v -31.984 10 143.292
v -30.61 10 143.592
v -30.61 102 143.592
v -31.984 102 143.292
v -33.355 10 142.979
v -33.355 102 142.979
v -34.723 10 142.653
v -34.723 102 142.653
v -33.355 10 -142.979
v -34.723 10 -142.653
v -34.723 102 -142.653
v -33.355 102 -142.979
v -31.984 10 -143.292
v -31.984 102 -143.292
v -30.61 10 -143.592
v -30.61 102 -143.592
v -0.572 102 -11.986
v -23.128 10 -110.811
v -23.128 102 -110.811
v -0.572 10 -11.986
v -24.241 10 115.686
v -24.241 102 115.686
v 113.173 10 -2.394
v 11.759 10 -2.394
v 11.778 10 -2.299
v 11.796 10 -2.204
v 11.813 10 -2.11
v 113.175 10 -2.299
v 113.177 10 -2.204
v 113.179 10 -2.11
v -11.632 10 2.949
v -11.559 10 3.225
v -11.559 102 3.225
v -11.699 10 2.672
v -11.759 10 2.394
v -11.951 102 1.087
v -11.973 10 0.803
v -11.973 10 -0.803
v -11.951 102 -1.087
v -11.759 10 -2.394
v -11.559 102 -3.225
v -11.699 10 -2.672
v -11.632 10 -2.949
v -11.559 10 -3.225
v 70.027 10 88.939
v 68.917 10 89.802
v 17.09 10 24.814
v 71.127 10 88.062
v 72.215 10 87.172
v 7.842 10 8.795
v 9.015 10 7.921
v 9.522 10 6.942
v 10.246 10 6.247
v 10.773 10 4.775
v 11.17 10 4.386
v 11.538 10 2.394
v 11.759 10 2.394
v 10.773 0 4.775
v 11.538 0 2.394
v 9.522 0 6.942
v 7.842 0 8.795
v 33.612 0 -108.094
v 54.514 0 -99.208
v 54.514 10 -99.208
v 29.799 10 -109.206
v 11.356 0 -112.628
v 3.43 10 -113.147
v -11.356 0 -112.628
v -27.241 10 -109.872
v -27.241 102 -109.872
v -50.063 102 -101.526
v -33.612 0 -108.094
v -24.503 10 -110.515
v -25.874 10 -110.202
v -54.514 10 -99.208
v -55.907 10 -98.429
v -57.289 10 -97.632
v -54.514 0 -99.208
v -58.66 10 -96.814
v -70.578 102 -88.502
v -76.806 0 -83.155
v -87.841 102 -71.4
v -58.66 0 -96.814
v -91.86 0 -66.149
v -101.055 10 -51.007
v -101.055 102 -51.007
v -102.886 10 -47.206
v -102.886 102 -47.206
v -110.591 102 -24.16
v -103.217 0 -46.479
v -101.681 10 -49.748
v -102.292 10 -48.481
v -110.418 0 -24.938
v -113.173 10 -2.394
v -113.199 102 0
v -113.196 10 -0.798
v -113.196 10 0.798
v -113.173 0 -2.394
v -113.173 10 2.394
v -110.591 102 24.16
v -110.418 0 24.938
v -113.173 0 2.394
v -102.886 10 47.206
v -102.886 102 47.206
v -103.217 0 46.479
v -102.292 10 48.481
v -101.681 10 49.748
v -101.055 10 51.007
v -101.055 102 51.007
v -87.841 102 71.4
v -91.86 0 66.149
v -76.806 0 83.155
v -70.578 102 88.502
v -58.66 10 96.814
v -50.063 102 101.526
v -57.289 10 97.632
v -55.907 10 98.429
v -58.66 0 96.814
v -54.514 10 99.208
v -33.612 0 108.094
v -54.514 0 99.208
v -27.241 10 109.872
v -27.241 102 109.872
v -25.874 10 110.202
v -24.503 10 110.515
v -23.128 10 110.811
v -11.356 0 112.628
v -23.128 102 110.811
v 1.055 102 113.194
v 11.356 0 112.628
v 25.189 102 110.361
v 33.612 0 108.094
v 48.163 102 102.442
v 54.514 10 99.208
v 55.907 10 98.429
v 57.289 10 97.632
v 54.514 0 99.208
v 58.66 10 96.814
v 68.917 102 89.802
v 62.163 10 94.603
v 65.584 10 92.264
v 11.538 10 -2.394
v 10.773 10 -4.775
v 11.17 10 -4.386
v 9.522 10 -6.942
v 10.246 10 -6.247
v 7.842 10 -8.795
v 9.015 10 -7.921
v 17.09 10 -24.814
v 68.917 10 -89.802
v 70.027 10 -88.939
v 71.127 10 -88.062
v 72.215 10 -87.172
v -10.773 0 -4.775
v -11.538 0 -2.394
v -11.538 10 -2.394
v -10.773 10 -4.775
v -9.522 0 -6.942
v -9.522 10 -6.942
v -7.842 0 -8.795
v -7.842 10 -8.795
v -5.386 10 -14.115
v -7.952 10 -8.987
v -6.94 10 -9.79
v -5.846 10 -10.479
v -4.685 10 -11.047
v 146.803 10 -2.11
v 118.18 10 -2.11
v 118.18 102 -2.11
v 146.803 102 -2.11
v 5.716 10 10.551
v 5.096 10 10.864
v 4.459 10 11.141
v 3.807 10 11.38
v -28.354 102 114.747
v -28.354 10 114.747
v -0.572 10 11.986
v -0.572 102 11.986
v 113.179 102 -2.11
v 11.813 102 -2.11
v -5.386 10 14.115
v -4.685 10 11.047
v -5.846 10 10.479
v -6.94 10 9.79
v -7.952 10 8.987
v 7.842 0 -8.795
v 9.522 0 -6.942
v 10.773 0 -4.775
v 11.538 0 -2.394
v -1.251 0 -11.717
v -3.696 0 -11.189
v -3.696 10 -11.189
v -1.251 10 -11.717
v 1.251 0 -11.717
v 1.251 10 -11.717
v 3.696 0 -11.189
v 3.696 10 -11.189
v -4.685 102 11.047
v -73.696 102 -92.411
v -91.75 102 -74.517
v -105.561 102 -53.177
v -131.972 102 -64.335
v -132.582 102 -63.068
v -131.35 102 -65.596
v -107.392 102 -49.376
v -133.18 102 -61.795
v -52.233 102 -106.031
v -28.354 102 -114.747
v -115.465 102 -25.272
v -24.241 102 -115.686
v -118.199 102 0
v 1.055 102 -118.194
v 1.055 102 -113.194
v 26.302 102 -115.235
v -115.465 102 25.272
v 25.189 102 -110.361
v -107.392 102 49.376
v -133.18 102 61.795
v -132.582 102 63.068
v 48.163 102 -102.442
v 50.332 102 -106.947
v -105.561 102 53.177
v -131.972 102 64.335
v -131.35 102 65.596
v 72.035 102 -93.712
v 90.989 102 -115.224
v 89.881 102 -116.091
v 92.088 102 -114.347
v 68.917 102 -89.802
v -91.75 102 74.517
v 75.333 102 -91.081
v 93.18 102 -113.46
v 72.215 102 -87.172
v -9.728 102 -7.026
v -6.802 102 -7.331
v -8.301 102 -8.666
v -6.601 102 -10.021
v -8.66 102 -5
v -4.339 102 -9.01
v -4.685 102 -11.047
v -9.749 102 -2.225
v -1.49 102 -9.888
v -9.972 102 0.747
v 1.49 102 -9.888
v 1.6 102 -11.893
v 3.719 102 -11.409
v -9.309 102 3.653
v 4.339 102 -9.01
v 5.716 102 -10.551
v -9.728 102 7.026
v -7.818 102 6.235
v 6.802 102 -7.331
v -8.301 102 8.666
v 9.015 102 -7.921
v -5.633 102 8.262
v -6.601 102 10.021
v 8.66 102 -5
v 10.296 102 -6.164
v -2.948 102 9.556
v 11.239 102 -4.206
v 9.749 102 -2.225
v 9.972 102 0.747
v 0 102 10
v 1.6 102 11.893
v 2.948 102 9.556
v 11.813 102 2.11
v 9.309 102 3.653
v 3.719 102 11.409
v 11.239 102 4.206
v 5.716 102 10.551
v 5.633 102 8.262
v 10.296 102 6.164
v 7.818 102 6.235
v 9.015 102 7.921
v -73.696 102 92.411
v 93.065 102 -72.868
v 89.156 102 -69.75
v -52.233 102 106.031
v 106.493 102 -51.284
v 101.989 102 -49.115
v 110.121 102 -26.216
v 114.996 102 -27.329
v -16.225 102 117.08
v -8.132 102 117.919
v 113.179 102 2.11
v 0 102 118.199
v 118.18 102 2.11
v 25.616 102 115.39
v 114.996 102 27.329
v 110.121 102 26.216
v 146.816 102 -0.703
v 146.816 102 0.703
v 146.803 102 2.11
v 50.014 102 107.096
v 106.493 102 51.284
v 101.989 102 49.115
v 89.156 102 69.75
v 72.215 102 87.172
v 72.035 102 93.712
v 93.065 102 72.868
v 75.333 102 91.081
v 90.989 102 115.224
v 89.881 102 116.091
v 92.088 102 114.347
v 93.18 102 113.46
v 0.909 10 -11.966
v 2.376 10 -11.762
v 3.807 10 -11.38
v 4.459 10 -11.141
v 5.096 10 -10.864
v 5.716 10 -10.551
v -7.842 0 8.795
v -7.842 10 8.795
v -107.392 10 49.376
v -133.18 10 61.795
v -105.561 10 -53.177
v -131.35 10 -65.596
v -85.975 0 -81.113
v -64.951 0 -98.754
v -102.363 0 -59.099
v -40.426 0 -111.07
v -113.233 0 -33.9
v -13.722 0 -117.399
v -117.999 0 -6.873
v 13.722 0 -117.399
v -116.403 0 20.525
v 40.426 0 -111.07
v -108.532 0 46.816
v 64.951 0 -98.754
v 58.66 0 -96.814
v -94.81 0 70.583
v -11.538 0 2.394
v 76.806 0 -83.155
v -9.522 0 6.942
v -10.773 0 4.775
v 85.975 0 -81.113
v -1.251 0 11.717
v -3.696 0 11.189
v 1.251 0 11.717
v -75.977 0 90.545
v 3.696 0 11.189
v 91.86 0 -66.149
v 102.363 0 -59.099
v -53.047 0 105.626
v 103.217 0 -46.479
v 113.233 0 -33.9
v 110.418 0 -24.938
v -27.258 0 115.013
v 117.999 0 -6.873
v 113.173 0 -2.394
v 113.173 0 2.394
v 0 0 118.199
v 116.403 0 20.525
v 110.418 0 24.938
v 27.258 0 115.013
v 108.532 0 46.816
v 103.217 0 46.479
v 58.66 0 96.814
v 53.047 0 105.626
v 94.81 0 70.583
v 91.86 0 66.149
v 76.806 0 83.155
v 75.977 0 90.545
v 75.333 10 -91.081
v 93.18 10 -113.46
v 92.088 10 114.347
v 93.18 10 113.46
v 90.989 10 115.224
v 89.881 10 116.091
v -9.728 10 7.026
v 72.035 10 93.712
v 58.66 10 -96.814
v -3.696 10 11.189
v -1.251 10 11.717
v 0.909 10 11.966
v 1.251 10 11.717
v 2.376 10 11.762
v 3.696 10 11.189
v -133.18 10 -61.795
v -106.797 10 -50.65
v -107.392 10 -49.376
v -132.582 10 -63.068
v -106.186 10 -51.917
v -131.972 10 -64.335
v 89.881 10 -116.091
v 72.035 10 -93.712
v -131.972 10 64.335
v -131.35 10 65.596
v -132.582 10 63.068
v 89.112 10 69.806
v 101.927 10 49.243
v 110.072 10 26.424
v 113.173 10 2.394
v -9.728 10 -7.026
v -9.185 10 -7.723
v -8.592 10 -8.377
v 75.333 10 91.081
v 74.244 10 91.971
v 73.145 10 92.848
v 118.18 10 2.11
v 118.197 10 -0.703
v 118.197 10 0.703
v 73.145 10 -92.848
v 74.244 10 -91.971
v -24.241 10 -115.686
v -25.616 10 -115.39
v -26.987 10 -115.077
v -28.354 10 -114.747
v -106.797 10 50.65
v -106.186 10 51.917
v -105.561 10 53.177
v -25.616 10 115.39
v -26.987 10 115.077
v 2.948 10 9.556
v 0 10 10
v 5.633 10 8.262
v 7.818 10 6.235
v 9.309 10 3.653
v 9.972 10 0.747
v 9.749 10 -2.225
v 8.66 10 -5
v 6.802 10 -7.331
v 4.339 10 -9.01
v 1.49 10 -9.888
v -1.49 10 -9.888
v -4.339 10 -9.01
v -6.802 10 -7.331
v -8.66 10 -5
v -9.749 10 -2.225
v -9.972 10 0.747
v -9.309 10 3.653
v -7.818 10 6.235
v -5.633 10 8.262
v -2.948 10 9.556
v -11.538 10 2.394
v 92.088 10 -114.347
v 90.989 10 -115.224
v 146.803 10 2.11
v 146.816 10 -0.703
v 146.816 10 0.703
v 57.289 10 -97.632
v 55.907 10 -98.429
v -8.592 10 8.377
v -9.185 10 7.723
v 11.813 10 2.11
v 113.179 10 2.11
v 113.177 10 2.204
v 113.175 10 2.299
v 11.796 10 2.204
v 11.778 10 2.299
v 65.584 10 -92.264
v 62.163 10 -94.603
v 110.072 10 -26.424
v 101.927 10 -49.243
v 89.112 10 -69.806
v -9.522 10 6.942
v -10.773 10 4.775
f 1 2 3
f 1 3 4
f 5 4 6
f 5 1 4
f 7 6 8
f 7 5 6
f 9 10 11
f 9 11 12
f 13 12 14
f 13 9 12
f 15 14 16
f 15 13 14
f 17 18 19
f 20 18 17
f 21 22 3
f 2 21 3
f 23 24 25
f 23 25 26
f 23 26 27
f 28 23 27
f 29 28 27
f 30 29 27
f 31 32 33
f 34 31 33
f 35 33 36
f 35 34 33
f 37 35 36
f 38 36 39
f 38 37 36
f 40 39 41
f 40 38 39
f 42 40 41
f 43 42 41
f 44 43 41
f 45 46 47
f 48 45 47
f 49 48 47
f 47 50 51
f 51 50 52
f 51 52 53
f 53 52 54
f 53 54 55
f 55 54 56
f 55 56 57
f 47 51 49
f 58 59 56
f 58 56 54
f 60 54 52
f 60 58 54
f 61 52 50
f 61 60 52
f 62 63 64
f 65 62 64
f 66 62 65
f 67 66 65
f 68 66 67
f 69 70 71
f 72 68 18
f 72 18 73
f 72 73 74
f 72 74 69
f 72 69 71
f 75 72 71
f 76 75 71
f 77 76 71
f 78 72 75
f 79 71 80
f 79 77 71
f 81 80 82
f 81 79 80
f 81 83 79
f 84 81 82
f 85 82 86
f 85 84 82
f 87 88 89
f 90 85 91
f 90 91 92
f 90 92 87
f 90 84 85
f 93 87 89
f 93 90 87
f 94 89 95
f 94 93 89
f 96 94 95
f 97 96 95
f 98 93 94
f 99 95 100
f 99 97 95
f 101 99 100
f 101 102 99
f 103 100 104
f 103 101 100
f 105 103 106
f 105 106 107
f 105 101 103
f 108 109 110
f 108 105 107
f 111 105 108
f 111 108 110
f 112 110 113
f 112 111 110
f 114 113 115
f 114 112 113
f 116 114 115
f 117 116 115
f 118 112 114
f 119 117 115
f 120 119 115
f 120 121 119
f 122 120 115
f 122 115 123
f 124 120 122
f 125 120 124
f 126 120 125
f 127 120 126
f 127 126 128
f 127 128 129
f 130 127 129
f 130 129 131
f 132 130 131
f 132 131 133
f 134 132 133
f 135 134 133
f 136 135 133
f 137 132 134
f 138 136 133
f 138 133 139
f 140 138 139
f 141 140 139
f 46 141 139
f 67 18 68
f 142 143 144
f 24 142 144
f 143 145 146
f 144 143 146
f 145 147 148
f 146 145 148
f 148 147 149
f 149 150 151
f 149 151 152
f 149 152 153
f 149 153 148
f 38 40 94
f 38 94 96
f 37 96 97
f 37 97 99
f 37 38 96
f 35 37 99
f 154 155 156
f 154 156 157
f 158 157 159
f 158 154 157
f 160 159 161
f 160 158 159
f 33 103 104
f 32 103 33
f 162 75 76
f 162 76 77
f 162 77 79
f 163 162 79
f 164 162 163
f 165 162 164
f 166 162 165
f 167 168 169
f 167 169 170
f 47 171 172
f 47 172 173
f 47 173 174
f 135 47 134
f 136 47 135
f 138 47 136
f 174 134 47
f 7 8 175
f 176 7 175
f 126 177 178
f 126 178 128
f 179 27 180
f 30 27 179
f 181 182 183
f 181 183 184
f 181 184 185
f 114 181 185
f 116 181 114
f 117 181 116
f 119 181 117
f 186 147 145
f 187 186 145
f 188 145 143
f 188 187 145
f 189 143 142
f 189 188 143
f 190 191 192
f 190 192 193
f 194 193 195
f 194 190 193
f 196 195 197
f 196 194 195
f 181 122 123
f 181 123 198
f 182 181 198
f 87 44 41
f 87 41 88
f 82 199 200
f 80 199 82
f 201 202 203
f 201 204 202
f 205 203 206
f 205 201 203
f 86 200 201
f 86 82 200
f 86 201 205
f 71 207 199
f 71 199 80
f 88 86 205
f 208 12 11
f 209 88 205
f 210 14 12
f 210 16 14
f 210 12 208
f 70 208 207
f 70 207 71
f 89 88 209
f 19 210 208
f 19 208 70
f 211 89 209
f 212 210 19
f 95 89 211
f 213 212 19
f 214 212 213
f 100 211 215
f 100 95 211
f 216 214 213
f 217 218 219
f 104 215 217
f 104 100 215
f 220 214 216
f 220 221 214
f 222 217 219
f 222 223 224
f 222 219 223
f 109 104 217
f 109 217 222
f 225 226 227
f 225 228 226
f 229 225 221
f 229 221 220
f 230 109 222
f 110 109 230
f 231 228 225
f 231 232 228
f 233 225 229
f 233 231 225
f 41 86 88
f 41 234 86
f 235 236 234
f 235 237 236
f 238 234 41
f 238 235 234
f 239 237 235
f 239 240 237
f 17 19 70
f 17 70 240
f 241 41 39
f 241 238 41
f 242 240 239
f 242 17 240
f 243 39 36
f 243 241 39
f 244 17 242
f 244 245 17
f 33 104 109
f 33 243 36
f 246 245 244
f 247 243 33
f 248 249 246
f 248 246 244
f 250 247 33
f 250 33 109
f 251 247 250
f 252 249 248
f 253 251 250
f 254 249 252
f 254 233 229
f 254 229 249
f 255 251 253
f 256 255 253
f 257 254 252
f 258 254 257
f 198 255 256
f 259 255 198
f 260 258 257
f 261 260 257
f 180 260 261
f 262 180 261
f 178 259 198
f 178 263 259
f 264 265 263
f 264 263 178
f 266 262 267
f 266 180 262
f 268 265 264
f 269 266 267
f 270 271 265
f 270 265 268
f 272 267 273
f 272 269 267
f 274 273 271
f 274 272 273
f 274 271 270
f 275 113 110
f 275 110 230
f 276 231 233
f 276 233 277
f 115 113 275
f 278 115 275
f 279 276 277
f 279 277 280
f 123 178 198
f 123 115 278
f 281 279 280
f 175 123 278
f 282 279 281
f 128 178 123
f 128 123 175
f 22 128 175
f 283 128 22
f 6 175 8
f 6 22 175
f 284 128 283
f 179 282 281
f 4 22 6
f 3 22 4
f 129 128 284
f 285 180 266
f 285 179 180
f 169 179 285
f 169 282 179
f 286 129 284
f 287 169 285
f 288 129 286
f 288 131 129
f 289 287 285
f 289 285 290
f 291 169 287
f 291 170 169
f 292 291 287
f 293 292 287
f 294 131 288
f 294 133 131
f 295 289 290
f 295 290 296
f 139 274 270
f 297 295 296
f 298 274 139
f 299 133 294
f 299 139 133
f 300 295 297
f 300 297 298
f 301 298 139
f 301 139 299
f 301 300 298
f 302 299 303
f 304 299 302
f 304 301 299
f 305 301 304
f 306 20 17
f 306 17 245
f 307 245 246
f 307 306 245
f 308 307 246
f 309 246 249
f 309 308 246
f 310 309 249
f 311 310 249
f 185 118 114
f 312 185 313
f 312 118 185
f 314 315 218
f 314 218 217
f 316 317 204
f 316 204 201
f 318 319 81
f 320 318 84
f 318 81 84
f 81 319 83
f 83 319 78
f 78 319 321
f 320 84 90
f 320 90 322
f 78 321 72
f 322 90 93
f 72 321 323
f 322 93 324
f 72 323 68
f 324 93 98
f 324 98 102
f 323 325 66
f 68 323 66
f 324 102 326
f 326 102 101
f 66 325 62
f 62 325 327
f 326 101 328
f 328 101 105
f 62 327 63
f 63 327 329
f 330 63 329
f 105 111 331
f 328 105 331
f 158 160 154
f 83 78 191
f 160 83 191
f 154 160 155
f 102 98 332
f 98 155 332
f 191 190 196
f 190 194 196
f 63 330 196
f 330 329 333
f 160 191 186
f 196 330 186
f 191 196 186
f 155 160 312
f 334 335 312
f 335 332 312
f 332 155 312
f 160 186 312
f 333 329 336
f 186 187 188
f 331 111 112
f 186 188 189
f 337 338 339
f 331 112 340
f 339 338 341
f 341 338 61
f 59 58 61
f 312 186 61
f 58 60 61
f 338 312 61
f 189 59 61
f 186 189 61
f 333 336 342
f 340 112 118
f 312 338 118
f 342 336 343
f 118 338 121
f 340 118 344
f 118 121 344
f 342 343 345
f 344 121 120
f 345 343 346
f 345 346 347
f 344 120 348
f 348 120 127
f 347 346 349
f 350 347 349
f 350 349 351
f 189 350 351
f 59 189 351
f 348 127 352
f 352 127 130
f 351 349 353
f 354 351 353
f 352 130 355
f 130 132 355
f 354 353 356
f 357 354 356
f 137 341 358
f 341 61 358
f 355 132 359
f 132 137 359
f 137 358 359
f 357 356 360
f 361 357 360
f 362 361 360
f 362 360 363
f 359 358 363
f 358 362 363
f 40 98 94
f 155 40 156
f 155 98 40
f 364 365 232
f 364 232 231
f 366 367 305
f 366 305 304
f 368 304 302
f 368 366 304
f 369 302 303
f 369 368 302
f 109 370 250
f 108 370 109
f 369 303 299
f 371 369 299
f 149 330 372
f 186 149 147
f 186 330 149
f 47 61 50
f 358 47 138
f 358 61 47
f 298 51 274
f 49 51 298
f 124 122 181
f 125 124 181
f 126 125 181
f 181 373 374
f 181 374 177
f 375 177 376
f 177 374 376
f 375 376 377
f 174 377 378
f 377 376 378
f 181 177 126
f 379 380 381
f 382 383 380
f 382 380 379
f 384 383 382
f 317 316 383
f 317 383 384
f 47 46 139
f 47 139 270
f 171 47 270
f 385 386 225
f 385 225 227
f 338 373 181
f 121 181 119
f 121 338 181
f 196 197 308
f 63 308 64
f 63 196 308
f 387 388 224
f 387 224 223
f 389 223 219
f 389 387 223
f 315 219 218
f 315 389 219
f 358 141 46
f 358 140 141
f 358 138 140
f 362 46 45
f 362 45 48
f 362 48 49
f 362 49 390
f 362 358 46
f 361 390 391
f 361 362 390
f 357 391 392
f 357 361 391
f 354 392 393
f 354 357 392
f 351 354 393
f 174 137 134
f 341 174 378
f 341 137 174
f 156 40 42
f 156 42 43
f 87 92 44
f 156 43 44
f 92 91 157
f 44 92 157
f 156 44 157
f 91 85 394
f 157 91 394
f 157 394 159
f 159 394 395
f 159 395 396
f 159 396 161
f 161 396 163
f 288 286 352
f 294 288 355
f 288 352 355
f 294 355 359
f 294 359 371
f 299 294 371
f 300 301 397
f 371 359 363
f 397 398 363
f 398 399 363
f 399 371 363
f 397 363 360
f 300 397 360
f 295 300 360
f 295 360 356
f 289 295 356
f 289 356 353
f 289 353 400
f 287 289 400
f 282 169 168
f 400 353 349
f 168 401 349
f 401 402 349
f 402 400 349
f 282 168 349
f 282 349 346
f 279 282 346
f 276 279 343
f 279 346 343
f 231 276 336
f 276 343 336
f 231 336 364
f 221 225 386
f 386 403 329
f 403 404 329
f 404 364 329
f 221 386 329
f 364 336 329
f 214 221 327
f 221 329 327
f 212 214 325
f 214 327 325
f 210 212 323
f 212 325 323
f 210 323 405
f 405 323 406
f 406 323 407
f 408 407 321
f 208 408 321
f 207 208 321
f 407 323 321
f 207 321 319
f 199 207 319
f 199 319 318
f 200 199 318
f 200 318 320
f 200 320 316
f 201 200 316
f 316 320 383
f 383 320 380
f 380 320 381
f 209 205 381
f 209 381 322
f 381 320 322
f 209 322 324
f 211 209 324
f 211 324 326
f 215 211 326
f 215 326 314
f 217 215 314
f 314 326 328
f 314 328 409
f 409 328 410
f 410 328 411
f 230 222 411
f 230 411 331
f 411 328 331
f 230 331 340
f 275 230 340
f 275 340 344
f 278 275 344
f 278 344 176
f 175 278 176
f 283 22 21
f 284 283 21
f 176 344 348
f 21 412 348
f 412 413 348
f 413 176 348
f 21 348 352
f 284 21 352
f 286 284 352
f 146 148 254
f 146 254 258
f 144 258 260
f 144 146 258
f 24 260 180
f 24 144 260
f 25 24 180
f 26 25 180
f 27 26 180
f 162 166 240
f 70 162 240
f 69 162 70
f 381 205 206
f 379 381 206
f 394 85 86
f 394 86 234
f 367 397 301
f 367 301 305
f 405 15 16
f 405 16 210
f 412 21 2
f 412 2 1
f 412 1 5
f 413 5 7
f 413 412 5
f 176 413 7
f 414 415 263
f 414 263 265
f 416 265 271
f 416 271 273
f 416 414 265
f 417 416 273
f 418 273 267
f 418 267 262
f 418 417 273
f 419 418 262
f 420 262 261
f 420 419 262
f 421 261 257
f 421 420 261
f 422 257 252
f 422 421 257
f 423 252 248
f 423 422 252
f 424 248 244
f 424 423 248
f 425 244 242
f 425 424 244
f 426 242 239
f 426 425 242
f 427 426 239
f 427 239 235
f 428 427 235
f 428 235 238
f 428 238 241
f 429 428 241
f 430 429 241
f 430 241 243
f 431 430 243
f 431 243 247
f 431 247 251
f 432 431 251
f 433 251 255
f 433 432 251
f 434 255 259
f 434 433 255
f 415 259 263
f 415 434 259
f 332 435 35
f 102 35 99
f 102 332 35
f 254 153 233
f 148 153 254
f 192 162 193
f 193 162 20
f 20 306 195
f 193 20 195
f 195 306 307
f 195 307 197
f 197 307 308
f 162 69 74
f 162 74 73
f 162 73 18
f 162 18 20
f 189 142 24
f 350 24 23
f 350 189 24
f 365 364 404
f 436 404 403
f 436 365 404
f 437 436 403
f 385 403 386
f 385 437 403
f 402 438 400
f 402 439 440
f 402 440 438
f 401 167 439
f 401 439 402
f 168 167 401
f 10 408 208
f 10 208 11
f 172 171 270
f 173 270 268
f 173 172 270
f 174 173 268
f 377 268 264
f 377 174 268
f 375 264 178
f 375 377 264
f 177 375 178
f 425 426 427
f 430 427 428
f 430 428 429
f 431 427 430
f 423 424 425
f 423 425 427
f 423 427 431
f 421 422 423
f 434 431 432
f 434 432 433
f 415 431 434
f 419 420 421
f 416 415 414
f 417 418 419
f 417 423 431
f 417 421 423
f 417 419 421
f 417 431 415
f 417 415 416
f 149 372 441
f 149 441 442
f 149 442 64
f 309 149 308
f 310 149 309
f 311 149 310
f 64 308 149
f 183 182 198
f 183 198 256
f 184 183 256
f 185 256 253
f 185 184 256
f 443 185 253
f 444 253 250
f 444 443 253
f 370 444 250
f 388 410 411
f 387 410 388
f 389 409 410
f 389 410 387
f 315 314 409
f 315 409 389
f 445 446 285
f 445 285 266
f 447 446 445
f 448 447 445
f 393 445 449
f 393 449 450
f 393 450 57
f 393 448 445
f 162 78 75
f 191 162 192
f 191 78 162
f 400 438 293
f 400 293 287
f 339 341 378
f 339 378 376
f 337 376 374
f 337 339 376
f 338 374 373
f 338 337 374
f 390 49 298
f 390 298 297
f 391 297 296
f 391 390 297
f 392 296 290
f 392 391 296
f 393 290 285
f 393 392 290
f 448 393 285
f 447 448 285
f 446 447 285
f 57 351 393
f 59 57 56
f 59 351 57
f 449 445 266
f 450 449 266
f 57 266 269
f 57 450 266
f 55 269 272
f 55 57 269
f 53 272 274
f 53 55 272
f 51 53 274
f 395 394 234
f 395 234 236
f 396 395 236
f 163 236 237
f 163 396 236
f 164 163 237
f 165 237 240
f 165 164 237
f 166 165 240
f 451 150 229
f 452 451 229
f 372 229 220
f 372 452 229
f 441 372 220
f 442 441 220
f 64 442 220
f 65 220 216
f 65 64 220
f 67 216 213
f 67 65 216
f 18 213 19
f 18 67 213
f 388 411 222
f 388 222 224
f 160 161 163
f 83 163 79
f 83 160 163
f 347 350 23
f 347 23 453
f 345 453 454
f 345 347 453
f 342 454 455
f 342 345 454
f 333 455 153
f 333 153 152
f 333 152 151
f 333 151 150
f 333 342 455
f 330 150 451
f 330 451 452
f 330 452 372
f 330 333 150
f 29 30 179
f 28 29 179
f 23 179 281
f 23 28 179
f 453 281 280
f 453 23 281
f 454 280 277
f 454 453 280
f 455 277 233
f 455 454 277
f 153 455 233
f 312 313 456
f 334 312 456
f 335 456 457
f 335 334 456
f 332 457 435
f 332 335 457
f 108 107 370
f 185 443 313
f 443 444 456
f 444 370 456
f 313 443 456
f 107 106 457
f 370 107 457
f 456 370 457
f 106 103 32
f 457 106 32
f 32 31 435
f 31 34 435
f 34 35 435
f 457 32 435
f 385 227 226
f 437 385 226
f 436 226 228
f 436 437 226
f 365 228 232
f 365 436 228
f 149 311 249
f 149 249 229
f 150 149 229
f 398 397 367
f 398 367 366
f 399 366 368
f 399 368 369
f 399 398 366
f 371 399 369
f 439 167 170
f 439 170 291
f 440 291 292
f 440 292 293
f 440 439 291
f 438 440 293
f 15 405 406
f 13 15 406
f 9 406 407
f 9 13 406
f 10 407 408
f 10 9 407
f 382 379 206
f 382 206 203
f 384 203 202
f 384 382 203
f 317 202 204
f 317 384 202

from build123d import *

# Parameters (mm, degrees)
SKETCH1_R           = 113.19870133
BOSS_EXTRUDE1_DEPTH = 10
SKETCH3_R           = 10
BOSS_EXTRUDE2_DEPTH = 92
BOSS_EXTRUDE3_START = -10
SKETCH4_R           = 118.19870133
SKETCH4_R_2         = 113.19870133
BOSS_EXTRUDE3_DEPTH = 102
CUT_EXTRUDE1_START  = -59
CUT_EXTRUDE1_DEPTH  = 59


with BuildPart() as part:
    # Sketch1 → Boss-Extrude1 (new body)
    with BuildSketch(Plane(origin=(0, 0, 0), x_dir=(1, 0, 0), z_dir=(0, 1, 0))):
        with Locations(Location((0, 0, 0), (0, 0, 270))):
            Circle(SKETCH1_R)
    extrude(amount=BOSS_EXTRUDE1_DEPTH)

    # Sketch3 → Boss-Extrude2 (add)
    with BuildSketch(Plane(origin=(0, 10, 0), x_dir=(1, 0, 0), z_dir=(0, 1, 0))):
        with BuildLine():
            Line((11.81310243, 2.10964712), (146.802984355, 2.10964712))
            ThreePointArc((146.802984355, 2.10964712), (146.818142021, 0), (146.802984355, -2.10964712))
            Line((146.802984355, -2.10964712), (11.81310243, -2.10964712))
            ThreePointArc((11.81310243, -2.10964712), (10.811626415, -5.206604869), (9.014737429, -7.920511921))
            Line((9.014737429, -7.920511921), (93.179552163, -113.459851424))
            ThreePointArc((93.179552163, -113.459851424), (91.539614278, -114.78704563), (89.880775093, -116.090538354))
            Line((89.880775093, -116.090538354), (5.715960358, -10.55119885))
            ThreePointArc((5.715960358, -10.55119885), (2.670251207, -11.699134946), (-0.571908724, -11.986363936))
            Line((-0.571908724, -11.986363936), (-30.609983324, -143.591767687))
            ThreePointArc((-30.609983324, -143.591767687), (-32.670110084, -143.137104671), (-34.723491048, -142.652886392))
            Line((-34.723491048, -142.652886392), (-4.685416448, -11.047482641))
            ThreePointArc((-4.685416448, -11.047482641), (-7.481877622, -9.38197779), (-9.727895943, -7.02623943))
            Line((-9.727895943, -7.02623943), (-131.349577039, -65.596154143))
            ThreePointArc((-131.349577039, -65.596154143), (-132.278575204, -63.70200443), (-133.1802602, -61.794701388))
            Line((-133.1802602, -61.794701388), (-11.558579104, -3.224786676))
            ThreePointArc((-11.558579104, -3.224786676), (-12, 0), (-11.558579104, 3.224786676))
            Line((-11.558579104, 3.224786676), (-133.1802602, 61.794701388))
            ThreePointArc((-133.1802602, 61.794701388), (-132.278575204, 63.70200443), (-131.349577039, 65.596154143))
            Line((-131.349577039, 65.596154143), (-9.727895943, 7.02623943))
            ThreePointArc((-9.727895943, 7.02623943), (-7.481877622, 9.38197779), (-4.685416448, 11.047482641))
            Line((-4.685416448, 11.047482641), (-34.723491048, 142.652886392))
            ThreePointArc((-34.723491048, 142.652886392), (-32.670110084, 143.137104671), (-30.609983324, 143.591767687))
            Line((-30.609983324, 143.591767687), (-0.571908724, 11.986363936))
            ThreePointArc((-0.571908724, 11.986363936), (2.670251207, 11.699134946), (5.715960358, 10.55119885))
            Line((5.715960358, 10.55119885), (89.880775093, 116.090538354))
            ThreePointArc((89.880775093, 116.090538354), (91.539614278, 114.78704563), (93.179552163, 113.459851424))
            Line((93.179552163, 113.459851424), (9.014737429, 7.920511921))
            ThreePointArc((9.014737429, 7.920511921), (10.811626415, 5.206604869), (11.81310243, 2.10964712))
        make_face()
        with Locations(Location((0, 0, 0), (0, 0, 270))):
            Circle(SKETCH3_R, mode=Mode.SUBTRACT)
    extrude(amount=BOSS_EXTRUDE2_DEPTH)

    # Sketch4 → Boss-Extrude3 (add)
    with BuildSketch(Plane(origin=(0, 10, 0), x_dir=(1, 0, 0), z_dir=(0, 1, 0)).offset(BOSS_EXTRUDE3_START)):
        with Locations(Location((0, 0, 0), (0, 0, 270))):
            Circle(SKETCH4_R)
        Circle(SKETCH4_R_2, mode=Mode.SUBTRACT)
    extrude(amount=BOSS_EXTRUDE3_DEPTH)

    # Sketch5 → Cut-Extrude1 (cut)
    with BuildSketch(Plane(origin=(0, 10, 0), x_dir=(1, 0, 0), z_dir=(0, 1, 0)).offset(CUT_EXTRUDE1_START)):
        with BuildLine():
            Line((-113.173392965, 2.393555442), (-11.53804838, 2.393555442))
            ThreePointArc((-11.53804838, 2.393555442), (-10.204986578, 5.891851748), (-7.841904008, 8.795465286))
            Line((-7.841904008, 8.795465286), (-58.6595763, 96.814255619))
            ThreePointArc((-58.6595763, 96.814255619), (-98.032951027, 56.599350665), (-113.173392965, 2.393555442))
        make_face()
        with BuildLine():
            Line((-54.513816664, 99.207811061), (-3.696144372, 11.189020728))
            ThreePointArc((-3.696144372, 11.189020728), (0, 11.783703496), (3.696144372, 11.189020728))
            Line((3.696144372, 11.189020728), (54.513816664, 99.207811061))
            ThreePointArc((54.513816664, 99.207811061), (0, 113.19870133), (-54.513816664, 99.207811061))
        make_face()
        with BuildLine():
            Line((-58.6595763, -96.814255619), (-7.841904008, -8.795465286))
            ThreePointArc((-7.841904008, -8.795465286), (-10.204986578, -5.891851748), (-11.53804838, -2.393555442))
            Line((-11.53804838, -2.393555442), (-113.173392965, -2.393555442))
            ThreePointArc((-113.173392965, -2.393555442), (-98.032951027, -56.599350665), (-58.6595763, -96.814255619))
        make_face()
        with BuildLine():
            Line((54.513816664, -99.207811061), (3.696144372, -11.189020728))
            ThreePointArc((3.696144372, -11.189020728), (0, -11.783703496), (-3.696144372, -11.189020728))
            Line((-3.696144372, -11.189020728), (-54.513816664, -99.207811061))
            ThreePointArc((-54.513816664, -99.207811061), (0, -113.19870133), (54.513816664, -99.207811061))
        make_face()
        with BuildLine():
            Line((113.173392965, -2.393555442), (11.53804838, -2.393555442))
            ThreePointArc((11.53804838, -2.393555442), (10.204986578, -5.891851748), (7.841904008, -8.795465286))
            Line((7.841904008, -8.795465286), (58.6595763, -96.814255619))
            ThreePointArc((58.6595763, -96.814255619), (98.032951027, -56.599350665), (113.173392965, -2.393555442))
        make_face()
        with BuildLine():
            Line((58.6595763, 96.814255619), (7.841904008, 8.795465286))
            ThreePointArc((7.841904008, 8.795465286), (10.204986578, 5.891851748), (11.53804838, 2.393555442))
            Line((11.53804838, 2.393555442), (113.173392965, 2.393555442))
            ThreePointArc((113.173392965, 2.393555442), (98.032951027, 56.599350665), (58.6595763, 96.814255619))
        make_face()
    extrude(amount=CUT_EXTRUDE1_DEPTH, mode=Mode.SUBTRACT)


solid = part.part
